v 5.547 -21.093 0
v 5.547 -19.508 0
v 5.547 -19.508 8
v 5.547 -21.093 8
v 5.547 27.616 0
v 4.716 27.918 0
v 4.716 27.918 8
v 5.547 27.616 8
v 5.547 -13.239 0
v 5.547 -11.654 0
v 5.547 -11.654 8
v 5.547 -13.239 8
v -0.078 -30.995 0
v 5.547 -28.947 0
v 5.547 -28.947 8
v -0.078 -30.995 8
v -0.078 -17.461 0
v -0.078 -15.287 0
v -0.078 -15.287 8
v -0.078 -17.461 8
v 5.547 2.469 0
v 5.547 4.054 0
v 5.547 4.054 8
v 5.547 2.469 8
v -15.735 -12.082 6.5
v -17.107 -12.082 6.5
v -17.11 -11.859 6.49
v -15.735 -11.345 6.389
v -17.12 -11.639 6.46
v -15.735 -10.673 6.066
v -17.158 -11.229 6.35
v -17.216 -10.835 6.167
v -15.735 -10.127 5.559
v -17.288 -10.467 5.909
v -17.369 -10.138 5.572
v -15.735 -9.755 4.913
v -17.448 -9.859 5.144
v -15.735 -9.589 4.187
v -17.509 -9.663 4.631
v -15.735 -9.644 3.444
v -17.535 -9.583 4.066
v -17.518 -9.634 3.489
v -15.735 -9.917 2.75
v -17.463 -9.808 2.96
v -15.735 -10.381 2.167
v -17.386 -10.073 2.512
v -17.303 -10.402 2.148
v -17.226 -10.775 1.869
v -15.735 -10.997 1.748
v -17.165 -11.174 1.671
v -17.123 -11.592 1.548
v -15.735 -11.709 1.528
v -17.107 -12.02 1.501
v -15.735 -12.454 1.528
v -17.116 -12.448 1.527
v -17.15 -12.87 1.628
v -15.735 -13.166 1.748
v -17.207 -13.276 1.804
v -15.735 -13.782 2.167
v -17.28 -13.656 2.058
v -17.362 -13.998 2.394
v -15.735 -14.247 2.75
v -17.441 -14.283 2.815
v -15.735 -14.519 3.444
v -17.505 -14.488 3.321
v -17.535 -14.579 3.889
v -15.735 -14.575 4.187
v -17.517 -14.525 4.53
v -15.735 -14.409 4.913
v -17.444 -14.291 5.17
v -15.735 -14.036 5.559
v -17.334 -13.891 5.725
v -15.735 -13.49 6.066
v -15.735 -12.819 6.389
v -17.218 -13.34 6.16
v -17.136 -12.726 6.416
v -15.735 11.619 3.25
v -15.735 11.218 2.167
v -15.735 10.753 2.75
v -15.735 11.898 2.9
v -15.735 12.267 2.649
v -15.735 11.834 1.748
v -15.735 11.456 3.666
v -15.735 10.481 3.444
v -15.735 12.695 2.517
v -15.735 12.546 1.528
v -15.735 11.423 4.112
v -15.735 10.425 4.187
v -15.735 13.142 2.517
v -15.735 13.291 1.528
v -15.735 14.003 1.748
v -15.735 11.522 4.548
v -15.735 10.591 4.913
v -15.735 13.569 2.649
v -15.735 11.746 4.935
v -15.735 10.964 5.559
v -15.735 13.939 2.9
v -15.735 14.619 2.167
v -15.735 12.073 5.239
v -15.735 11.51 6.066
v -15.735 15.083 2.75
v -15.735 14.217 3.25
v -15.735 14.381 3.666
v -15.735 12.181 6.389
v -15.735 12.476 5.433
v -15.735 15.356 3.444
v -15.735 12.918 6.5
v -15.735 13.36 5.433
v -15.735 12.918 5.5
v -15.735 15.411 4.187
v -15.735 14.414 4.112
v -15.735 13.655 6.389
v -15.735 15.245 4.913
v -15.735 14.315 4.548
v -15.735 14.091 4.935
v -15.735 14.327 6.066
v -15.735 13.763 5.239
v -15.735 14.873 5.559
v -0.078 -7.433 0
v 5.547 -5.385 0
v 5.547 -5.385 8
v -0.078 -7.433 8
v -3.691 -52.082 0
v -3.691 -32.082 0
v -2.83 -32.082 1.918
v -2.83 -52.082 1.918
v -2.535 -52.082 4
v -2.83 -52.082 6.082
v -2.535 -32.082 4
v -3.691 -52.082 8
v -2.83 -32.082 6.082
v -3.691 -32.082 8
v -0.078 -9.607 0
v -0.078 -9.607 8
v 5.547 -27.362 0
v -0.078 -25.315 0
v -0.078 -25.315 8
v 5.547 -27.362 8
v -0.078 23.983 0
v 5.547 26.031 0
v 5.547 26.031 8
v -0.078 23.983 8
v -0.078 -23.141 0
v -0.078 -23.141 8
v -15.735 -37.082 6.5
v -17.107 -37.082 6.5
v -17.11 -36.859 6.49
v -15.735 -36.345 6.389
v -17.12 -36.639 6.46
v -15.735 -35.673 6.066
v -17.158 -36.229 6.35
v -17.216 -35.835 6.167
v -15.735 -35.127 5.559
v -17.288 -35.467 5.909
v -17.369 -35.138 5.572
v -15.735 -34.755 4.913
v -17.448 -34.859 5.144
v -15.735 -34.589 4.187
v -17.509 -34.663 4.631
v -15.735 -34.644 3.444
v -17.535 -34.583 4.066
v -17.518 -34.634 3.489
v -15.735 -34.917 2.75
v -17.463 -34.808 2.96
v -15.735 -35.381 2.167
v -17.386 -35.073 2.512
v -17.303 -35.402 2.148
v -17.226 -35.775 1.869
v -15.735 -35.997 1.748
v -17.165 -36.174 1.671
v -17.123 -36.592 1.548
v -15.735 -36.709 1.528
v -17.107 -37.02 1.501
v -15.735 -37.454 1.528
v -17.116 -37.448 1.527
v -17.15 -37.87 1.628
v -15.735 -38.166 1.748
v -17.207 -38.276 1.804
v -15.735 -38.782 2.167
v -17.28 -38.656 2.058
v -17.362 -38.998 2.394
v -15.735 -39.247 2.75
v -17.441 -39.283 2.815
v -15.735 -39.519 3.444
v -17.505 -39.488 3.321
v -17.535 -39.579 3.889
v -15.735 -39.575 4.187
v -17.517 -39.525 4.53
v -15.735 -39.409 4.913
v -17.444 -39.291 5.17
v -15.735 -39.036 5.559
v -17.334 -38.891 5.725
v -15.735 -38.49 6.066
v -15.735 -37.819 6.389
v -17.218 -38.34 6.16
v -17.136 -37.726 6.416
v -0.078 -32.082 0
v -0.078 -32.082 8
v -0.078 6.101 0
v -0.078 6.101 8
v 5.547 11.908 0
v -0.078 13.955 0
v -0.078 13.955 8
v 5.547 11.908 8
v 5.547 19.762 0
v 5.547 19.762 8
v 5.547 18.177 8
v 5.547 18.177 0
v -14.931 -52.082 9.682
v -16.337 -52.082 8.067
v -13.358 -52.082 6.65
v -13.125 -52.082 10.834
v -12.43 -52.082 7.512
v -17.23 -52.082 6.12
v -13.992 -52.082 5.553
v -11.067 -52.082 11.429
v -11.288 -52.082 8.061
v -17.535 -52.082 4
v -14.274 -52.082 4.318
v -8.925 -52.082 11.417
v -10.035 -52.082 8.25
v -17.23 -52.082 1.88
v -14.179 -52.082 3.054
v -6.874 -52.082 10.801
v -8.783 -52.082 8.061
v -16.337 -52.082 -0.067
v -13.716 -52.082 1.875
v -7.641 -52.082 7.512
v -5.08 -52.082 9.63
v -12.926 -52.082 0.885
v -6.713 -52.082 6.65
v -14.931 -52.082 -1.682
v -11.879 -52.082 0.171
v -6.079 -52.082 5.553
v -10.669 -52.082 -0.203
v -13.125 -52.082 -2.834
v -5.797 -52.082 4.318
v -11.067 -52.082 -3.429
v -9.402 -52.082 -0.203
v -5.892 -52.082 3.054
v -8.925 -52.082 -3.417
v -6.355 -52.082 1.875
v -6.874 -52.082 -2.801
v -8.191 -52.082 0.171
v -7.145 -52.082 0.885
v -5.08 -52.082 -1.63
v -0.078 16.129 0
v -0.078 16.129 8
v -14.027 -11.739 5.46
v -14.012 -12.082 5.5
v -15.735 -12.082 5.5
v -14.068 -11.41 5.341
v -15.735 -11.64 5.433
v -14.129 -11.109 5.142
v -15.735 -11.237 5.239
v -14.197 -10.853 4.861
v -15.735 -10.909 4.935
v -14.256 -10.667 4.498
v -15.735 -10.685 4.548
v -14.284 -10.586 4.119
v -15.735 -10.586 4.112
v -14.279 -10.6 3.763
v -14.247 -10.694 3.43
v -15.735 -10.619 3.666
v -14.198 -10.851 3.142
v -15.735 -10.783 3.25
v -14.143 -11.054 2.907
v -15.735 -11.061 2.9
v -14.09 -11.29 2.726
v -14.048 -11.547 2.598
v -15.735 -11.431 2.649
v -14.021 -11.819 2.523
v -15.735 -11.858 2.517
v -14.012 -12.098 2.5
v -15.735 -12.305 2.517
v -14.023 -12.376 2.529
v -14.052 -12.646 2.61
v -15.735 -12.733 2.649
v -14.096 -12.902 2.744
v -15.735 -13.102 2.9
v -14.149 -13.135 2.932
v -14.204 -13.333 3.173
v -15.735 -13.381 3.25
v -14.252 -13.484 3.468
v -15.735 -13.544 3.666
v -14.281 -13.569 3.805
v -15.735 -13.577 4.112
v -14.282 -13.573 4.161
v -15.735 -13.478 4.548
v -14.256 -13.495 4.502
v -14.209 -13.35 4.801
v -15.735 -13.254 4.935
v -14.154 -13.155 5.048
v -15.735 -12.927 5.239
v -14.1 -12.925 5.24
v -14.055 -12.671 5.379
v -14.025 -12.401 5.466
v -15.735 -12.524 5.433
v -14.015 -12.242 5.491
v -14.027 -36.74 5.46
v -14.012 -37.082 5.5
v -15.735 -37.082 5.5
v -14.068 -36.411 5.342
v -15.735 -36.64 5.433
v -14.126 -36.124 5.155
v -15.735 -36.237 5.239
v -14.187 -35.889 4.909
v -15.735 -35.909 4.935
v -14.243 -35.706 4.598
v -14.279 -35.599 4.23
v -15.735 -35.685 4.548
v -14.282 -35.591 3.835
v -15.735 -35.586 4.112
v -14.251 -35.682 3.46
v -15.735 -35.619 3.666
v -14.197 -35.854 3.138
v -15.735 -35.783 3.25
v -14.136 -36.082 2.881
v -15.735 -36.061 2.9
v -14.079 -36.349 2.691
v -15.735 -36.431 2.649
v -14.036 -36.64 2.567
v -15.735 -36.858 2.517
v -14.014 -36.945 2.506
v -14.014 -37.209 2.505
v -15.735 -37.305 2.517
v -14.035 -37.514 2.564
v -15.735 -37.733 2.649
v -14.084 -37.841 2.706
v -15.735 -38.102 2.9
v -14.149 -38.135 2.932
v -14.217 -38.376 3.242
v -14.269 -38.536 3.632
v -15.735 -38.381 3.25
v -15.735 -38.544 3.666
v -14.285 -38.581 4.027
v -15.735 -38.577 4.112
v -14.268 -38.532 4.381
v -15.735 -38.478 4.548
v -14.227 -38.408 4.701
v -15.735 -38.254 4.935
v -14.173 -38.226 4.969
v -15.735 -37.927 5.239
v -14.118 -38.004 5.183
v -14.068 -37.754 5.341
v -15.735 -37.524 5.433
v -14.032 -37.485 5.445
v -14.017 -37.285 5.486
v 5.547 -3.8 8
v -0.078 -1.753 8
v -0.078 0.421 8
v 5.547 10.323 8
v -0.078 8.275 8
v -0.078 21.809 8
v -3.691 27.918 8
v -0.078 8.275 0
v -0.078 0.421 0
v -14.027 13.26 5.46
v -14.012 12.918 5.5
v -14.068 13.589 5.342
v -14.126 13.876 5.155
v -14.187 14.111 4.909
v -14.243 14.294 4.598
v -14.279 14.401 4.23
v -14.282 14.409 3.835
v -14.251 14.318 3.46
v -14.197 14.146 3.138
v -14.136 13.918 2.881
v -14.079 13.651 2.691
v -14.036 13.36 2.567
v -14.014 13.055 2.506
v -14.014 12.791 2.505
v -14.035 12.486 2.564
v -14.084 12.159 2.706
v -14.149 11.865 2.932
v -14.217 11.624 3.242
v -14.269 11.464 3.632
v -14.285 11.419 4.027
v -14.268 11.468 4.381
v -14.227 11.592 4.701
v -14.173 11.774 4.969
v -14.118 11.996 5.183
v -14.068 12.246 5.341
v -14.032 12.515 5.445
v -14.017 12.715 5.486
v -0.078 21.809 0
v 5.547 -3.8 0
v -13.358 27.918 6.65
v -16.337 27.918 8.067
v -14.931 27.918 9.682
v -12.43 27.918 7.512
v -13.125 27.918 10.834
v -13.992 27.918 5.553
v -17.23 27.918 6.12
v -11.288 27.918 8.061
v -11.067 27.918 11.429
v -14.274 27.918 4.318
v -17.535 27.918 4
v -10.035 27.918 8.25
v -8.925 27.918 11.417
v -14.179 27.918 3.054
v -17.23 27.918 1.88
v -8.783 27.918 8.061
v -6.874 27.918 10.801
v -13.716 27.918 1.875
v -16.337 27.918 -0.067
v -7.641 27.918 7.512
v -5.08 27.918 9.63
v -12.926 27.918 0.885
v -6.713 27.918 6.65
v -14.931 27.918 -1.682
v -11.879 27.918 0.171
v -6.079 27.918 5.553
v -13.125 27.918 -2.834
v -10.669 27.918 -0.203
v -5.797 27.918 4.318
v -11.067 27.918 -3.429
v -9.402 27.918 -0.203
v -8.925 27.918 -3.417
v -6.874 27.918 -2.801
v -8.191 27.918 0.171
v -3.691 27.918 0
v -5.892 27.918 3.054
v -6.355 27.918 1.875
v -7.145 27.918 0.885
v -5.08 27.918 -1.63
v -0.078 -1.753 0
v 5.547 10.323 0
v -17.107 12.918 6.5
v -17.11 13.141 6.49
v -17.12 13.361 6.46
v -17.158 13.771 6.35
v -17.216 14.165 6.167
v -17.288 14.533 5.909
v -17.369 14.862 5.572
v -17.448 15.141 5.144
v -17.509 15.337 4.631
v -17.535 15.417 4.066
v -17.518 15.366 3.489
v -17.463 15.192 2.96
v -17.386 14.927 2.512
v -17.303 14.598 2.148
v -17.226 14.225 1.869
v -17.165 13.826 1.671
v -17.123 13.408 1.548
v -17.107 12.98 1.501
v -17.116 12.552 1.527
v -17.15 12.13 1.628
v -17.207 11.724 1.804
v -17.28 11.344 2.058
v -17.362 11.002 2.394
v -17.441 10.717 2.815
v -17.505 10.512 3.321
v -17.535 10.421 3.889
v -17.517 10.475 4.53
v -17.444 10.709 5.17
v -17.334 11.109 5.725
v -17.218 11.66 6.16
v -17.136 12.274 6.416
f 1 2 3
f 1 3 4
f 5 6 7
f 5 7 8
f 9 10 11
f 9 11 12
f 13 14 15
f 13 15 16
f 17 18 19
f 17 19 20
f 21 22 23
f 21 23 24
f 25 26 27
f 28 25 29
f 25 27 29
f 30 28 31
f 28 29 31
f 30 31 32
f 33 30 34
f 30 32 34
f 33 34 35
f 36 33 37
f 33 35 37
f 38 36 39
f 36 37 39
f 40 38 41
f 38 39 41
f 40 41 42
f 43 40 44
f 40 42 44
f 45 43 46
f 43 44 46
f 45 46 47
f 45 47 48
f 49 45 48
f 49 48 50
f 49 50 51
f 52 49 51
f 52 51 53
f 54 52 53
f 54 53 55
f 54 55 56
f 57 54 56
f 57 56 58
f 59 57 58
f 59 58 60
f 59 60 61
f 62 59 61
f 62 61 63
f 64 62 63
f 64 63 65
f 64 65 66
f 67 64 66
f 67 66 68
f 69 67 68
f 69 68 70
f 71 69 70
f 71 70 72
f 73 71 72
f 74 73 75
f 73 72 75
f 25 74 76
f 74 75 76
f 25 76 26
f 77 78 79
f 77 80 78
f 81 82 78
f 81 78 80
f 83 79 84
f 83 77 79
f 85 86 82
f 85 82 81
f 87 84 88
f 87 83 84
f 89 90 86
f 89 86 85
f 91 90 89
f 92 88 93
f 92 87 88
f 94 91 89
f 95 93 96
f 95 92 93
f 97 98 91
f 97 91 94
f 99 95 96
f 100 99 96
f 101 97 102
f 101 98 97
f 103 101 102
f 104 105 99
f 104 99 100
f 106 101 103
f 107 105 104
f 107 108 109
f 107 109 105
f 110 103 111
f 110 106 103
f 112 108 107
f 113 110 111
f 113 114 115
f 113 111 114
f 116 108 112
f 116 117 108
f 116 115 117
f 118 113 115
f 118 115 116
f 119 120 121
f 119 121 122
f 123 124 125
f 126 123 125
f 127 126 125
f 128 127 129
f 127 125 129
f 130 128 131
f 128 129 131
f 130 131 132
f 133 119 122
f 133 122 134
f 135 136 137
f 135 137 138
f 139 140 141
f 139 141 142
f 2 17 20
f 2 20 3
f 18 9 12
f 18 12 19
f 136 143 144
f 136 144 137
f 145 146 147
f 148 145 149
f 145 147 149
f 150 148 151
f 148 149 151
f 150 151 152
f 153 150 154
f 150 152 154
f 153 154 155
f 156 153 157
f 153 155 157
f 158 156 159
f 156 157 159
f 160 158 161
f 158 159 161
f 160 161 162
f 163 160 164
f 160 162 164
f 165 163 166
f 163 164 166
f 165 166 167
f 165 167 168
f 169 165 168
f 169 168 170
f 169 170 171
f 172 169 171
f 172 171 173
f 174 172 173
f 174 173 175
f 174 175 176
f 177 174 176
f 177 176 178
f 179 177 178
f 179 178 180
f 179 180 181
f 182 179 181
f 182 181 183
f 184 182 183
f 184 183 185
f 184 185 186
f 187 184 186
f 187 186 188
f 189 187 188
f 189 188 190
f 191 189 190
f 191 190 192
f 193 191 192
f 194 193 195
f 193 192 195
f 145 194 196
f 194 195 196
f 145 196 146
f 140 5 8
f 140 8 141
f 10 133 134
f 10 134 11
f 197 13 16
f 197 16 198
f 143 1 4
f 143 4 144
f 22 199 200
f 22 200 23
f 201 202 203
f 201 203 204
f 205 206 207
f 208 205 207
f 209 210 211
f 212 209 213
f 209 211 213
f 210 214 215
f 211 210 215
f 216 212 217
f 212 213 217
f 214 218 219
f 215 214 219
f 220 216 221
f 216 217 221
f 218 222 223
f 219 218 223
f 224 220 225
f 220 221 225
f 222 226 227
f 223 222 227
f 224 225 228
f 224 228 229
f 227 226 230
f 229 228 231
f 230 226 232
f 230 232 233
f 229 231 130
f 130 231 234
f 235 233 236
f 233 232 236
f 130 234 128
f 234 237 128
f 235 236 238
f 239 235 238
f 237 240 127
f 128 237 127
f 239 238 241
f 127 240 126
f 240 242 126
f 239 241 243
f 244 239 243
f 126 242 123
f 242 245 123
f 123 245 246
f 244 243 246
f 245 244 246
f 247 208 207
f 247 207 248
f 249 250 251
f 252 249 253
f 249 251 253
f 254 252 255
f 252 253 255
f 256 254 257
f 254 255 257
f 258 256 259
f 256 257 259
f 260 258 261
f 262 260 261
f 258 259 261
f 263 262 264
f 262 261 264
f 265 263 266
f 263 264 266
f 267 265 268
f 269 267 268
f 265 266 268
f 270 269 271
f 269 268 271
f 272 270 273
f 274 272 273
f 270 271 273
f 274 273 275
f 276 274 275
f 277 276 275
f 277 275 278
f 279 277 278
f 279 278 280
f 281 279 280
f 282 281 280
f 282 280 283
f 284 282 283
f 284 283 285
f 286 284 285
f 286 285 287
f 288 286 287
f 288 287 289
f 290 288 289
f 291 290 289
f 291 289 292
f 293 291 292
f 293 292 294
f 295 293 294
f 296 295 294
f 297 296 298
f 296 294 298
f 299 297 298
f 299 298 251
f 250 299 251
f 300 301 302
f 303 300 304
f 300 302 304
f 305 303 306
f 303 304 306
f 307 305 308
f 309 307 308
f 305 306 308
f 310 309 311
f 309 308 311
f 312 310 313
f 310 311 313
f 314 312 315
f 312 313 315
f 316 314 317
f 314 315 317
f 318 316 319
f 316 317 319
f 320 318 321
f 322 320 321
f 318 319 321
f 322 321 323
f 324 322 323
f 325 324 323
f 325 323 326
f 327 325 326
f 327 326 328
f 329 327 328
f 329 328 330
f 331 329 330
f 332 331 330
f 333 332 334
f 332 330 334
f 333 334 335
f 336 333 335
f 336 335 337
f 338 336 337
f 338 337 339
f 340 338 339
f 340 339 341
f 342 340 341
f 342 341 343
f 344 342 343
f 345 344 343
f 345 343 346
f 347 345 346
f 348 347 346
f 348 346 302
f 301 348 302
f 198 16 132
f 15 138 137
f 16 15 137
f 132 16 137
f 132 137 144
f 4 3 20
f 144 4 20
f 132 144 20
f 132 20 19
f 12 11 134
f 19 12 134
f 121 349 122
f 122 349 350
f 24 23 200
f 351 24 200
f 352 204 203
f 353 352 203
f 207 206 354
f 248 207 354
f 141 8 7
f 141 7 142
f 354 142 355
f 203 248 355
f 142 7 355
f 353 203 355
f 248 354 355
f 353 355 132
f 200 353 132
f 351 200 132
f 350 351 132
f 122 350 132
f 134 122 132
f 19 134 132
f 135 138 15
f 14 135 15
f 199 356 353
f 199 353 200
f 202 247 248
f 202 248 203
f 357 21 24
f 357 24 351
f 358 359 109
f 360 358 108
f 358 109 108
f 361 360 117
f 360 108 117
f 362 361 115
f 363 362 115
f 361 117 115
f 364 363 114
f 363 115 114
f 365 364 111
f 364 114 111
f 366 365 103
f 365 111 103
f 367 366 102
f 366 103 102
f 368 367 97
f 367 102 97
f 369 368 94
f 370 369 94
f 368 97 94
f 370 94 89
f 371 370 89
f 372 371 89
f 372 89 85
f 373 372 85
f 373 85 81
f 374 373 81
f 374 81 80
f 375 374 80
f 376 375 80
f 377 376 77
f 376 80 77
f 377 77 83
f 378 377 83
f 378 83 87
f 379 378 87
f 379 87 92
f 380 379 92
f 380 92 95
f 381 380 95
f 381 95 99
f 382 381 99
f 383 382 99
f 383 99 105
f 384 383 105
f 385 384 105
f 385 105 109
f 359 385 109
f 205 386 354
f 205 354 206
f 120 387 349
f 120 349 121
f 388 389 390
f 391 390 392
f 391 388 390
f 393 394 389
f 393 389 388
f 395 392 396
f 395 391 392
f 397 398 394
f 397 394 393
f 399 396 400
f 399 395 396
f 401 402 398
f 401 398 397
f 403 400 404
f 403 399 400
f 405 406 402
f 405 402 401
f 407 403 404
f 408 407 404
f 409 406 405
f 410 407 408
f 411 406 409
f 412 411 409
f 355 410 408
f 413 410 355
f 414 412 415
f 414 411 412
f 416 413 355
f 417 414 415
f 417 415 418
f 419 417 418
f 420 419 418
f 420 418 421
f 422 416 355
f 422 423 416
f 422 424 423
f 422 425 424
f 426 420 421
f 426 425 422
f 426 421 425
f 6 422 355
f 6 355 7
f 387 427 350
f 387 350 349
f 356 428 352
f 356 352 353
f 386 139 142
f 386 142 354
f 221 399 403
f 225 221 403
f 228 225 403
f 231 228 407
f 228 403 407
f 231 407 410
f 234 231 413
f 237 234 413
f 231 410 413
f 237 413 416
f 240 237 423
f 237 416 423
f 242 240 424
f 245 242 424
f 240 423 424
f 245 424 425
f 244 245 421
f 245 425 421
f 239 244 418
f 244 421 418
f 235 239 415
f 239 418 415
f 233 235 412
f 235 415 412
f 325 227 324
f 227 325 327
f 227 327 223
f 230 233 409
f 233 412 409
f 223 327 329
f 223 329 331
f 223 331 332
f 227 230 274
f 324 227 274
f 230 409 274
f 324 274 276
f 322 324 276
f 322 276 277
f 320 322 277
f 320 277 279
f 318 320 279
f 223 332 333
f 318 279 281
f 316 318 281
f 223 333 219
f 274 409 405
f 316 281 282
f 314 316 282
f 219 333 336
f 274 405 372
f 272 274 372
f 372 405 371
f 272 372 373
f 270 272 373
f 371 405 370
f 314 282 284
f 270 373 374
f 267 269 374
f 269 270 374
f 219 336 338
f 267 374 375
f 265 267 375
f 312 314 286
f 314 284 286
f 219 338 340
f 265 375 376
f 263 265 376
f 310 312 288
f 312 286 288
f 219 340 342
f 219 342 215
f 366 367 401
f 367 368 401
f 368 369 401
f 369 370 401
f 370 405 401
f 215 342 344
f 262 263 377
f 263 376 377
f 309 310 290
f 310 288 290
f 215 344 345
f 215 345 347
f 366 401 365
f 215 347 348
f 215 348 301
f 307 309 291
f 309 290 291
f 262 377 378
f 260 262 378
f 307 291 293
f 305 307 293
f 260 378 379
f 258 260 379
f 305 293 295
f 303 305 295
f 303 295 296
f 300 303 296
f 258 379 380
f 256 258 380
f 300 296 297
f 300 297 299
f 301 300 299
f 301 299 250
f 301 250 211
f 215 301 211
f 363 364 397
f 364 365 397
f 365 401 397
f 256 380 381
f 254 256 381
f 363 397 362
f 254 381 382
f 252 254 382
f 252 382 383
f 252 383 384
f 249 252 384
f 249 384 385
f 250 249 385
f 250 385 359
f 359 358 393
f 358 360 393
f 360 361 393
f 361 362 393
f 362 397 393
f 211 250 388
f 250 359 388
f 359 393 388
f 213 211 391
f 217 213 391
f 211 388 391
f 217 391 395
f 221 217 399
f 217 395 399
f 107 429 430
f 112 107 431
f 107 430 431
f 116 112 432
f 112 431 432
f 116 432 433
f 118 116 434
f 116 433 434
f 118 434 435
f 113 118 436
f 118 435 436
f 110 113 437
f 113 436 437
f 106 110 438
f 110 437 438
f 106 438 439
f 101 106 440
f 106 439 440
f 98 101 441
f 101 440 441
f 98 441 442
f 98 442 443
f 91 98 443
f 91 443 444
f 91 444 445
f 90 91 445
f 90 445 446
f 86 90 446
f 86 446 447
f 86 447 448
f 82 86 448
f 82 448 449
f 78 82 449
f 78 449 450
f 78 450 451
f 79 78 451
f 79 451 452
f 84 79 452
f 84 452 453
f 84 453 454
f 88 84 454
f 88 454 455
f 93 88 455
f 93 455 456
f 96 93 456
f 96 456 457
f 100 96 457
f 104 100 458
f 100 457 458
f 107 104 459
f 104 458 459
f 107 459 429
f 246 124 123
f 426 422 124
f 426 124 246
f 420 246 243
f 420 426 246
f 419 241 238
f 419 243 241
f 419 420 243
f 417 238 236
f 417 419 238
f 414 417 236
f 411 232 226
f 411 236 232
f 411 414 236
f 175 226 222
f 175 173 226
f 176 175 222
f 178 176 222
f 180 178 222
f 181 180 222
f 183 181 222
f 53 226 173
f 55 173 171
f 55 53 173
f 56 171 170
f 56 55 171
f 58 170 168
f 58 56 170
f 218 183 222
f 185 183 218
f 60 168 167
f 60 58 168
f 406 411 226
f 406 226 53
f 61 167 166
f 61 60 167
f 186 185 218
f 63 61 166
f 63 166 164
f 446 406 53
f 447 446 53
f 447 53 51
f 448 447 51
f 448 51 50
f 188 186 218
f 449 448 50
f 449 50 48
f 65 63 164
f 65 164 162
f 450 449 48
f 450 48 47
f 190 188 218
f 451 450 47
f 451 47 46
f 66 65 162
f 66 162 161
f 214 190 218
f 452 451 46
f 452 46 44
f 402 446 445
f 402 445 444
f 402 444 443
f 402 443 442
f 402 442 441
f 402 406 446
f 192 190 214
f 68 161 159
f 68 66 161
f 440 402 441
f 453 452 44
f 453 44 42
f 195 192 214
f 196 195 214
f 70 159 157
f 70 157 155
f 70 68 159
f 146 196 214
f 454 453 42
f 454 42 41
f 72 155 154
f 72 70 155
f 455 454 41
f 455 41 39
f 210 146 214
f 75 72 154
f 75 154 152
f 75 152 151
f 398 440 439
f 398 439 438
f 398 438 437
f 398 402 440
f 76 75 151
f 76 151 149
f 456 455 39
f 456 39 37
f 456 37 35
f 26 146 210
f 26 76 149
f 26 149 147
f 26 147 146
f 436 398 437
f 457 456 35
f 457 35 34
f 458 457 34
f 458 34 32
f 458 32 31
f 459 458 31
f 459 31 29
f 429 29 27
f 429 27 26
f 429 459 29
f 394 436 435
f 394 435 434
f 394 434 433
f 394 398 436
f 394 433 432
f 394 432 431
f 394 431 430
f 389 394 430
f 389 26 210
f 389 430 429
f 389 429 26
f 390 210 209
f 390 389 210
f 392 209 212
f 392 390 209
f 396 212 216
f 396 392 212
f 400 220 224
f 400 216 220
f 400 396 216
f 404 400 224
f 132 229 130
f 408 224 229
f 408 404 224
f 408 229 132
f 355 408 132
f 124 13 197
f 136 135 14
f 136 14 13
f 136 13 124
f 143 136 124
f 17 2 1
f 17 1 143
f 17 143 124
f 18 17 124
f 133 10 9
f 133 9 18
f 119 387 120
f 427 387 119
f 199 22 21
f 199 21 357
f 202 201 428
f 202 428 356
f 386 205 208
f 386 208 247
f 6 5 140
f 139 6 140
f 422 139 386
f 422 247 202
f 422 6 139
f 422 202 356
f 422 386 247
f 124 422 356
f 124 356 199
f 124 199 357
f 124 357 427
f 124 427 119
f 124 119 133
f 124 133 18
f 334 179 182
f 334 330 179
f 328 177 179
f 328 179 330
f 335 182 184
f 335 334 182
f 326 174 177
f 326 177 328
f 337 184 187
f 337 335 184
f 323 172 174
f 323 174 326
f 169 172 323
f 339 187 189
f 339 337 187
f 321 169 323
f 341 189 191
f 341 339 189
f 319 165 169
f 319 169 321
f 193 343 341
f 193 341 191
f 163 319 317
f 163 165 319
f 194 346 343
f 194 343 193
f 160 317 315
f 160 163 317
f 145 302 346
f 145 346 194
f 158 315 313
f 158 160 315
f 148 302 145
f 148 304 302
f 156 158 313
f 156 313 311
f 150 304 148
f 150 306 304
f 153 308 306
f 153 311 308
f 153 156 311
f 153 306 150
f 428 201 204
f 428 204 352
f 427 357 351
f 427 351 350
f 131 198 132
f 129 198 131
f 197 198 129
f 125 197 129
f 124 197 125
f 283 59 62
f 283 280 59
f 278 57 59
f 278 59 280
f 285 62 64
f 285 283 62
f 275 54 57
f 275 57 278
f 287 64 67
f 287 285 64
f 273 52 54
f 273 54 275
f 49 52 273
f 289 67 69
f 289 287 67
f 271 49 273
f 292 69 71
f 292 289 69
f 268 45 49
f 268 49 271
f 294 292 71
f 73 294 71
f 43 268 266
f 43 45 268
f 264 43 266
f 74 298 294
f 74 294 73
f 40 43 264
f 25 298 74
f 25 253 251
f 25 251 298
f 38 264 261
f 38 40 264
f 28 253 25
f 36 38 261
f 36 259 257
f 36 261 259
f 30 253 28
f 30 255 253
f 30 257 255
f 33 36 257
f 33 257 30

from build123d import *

# Parameters (mm, degrees)
SALIENTE_EXTRUIR1_DEPTH = 8
CROQUIS2_R              = 4.25
SALIENTE_EXTRUIR2_DEPTH = 80
CROQUIS4_R              = 1.5
CORTAR_EXTRUIR1_DEPTH   = 5
CROQUIS5_R              = 1.5
CORTAR_EXTRUIR2_DEPTH   = 7
SALIENTE_EXTRUIR3_START = -70
CROQUIS6_R              = 7.5
CROQUIS6_R_2            = 4.25
SALIENTE_EXTRUIR3_DEPTH = 70
CROQUIS7_R              = 1.5
CORTAR_EXTRUIR3_DEPTH   = 10
CROQUIS11_R             = 2.5
CORTAR_EXTRUIR4_DEPTH   = 1.8


with BuildPart() as part:
    # Croquis1 → Saliente-Extruir1 (new body)
    with BuildSketch(Plane(origin=(0, 0, 0), x_dir=(-1, 0, 0), z_dir=(0, 0, -1))):
        Polygon((-5.547383556, 27.615747118), (-5.547383556, 26.030607477), (0.077616444, 23.983274909), (0.077616444, 21.809098061), (-5.547383556, 19.761765493), (-5.547383556, 18.176625852), (0.077616444, 16.129293284), (0.077616444, 13.955116436), (-5.547383556, 11.907783868), (-5.547383556, 10.322644227), (0.077616444, 8.275311659), (0.077616444, 6.101134811), (-5.547383556, 4.053802243), (-5.547383556, 2.468662602), (0.077616444, 0.421330034), (0.077616444, -1.752846814), (-5.547383556, -3.800179382), (-5.547383556, -5.385319023), (0.077616444, -7.432651591), (0.077616444, -9.606828439), (-5.547383556, -11.654161007), (-5.547383556, -13.239300648), (0.077616444, -15.286633216), (0.077616444, -17.460810064), (-5.547383556, -19.508142632), (-5.547383556, -21.093282273), (0.077616444, -23.140614841), (0.077616444, -25.314791689), (-5.547383556, -27.362124257), (-5.547383556, -28.947263898), (0.077616444, -30.994596466), (0.077616444, -32.08168489), (4.952616444, -32.08168489), (4.952616444, 27.91831511), (-4.71608483, 27.91831511), align=None)
    extrude(amount=-SALIENTE_EXTRUIR1_DEPTH)

    # Croquis2 → Saliente-Extruir2 (add)
    with BuildSketch(Plane(origin=(0, 27.91831511, 0), x_dir=(1, 0, 0), z_dir=(0, 1, 0))):
        with BuildLine():
            Line((-4.952616444, -8), (-4.952616444, -4))
            Line((-4.952616444, -4), (-4.952616444, 0))
            Line((-4.952616444, 0), (-3.691152355, 0))
            ThreePointArc((-3.691152355, 0), (-17.535441126, -4), (-3.691152355, -8))
            Line((-3.691152355, -8), (-4.952616444, -8))
        make_face()
        with Locations(Location((-10.035441126, -4, 0), (0, 0, 270))):
            Circle(CROQUIS2_R, mode=Mode.SUBTRACT)
    extrude(amount=-SALIENTE_EXTRUIR2_DEPTH)

    # Croquis4 → Cortar-Extruir1 (cut)
    with BuildSketch(Plane.ZY.offset(17.535441126)):
        with Locations((4, 12.91831511)):
            Circle(CROQUIS4_R)
        with Locations((4, -37.08168489)):
            Circle(CROQUIS4_R)
    extrude(amount=-CORTAR_EXTRUIR1_DEPTH, mode=Mode.SUBTRACT)

    # Croquis5 → Cortar-Extruir2 (cut, symmetric)
    with BuildSketch(Plane.ZY.offset(17.535441126)):
        with Locations(Location((4, -12.08168489, 0), (0, 0, 180))):
            Circle(CROQUIS5_R)
    extrude(amount=CORTAR_EXTRUIR2_DEPTH, both=True, mode=Mode.SUBTRACT)

    # Croquis6 → Saliente-Extruir3 (add)
    with BuildSketch(Plane.XZ.offset(52.08168489).offset(SALIENTE_EXTRUIR3_START)):
        with Locations(Location((-10.035441126, 4, 0), (0, 0, 90))):
            Circle(CROQUIS6_R)
        with Locations(Location((-10.035441126, 4, 0), (0, 0, 90))):
            Circle(CROQUIS6_R_2, mode=Mode.SUBTRACT)
    extrude(amount=SALIENTE_EXTRUIR3_DEPTH)

    # Croquis7 → Cortar-Extruir3 (cut)
    with BuildSketch(Plane.ZY.offset(17.535441126)):
        with Locations((4, -12.08168489)):
            Circle(CROQUIS7_R)
        with Locations((4, -37.08168489)):
            Circle(CROQUIS7_R)
        with Locations((4, 12.91831511)):
            Circle(CROQUIS7_R)
    extrude(amount=-CORTAR_EXTRUIR3_DEPTH, mode=Mode.SUBTRACT)

    # Croquis11 → Cortar-Extruir4 (cut)
    with BuildSketch(Plane.ZY.offset(17.535441126)):
        with Locations((4, 12.91831511)):
            Circle(CROQUIS11_R)
        with Locations((4, -12.08168489)):
            Circle(CROQUIS11_R)
        with Locations((4, -37.08168489)):
            Circle(CROQUIS11_R)
    extrude(amount=-CORTAR_EXTRUIR4_DEPTH, mode=Mode.SUBTRACT)


solid = part.part
